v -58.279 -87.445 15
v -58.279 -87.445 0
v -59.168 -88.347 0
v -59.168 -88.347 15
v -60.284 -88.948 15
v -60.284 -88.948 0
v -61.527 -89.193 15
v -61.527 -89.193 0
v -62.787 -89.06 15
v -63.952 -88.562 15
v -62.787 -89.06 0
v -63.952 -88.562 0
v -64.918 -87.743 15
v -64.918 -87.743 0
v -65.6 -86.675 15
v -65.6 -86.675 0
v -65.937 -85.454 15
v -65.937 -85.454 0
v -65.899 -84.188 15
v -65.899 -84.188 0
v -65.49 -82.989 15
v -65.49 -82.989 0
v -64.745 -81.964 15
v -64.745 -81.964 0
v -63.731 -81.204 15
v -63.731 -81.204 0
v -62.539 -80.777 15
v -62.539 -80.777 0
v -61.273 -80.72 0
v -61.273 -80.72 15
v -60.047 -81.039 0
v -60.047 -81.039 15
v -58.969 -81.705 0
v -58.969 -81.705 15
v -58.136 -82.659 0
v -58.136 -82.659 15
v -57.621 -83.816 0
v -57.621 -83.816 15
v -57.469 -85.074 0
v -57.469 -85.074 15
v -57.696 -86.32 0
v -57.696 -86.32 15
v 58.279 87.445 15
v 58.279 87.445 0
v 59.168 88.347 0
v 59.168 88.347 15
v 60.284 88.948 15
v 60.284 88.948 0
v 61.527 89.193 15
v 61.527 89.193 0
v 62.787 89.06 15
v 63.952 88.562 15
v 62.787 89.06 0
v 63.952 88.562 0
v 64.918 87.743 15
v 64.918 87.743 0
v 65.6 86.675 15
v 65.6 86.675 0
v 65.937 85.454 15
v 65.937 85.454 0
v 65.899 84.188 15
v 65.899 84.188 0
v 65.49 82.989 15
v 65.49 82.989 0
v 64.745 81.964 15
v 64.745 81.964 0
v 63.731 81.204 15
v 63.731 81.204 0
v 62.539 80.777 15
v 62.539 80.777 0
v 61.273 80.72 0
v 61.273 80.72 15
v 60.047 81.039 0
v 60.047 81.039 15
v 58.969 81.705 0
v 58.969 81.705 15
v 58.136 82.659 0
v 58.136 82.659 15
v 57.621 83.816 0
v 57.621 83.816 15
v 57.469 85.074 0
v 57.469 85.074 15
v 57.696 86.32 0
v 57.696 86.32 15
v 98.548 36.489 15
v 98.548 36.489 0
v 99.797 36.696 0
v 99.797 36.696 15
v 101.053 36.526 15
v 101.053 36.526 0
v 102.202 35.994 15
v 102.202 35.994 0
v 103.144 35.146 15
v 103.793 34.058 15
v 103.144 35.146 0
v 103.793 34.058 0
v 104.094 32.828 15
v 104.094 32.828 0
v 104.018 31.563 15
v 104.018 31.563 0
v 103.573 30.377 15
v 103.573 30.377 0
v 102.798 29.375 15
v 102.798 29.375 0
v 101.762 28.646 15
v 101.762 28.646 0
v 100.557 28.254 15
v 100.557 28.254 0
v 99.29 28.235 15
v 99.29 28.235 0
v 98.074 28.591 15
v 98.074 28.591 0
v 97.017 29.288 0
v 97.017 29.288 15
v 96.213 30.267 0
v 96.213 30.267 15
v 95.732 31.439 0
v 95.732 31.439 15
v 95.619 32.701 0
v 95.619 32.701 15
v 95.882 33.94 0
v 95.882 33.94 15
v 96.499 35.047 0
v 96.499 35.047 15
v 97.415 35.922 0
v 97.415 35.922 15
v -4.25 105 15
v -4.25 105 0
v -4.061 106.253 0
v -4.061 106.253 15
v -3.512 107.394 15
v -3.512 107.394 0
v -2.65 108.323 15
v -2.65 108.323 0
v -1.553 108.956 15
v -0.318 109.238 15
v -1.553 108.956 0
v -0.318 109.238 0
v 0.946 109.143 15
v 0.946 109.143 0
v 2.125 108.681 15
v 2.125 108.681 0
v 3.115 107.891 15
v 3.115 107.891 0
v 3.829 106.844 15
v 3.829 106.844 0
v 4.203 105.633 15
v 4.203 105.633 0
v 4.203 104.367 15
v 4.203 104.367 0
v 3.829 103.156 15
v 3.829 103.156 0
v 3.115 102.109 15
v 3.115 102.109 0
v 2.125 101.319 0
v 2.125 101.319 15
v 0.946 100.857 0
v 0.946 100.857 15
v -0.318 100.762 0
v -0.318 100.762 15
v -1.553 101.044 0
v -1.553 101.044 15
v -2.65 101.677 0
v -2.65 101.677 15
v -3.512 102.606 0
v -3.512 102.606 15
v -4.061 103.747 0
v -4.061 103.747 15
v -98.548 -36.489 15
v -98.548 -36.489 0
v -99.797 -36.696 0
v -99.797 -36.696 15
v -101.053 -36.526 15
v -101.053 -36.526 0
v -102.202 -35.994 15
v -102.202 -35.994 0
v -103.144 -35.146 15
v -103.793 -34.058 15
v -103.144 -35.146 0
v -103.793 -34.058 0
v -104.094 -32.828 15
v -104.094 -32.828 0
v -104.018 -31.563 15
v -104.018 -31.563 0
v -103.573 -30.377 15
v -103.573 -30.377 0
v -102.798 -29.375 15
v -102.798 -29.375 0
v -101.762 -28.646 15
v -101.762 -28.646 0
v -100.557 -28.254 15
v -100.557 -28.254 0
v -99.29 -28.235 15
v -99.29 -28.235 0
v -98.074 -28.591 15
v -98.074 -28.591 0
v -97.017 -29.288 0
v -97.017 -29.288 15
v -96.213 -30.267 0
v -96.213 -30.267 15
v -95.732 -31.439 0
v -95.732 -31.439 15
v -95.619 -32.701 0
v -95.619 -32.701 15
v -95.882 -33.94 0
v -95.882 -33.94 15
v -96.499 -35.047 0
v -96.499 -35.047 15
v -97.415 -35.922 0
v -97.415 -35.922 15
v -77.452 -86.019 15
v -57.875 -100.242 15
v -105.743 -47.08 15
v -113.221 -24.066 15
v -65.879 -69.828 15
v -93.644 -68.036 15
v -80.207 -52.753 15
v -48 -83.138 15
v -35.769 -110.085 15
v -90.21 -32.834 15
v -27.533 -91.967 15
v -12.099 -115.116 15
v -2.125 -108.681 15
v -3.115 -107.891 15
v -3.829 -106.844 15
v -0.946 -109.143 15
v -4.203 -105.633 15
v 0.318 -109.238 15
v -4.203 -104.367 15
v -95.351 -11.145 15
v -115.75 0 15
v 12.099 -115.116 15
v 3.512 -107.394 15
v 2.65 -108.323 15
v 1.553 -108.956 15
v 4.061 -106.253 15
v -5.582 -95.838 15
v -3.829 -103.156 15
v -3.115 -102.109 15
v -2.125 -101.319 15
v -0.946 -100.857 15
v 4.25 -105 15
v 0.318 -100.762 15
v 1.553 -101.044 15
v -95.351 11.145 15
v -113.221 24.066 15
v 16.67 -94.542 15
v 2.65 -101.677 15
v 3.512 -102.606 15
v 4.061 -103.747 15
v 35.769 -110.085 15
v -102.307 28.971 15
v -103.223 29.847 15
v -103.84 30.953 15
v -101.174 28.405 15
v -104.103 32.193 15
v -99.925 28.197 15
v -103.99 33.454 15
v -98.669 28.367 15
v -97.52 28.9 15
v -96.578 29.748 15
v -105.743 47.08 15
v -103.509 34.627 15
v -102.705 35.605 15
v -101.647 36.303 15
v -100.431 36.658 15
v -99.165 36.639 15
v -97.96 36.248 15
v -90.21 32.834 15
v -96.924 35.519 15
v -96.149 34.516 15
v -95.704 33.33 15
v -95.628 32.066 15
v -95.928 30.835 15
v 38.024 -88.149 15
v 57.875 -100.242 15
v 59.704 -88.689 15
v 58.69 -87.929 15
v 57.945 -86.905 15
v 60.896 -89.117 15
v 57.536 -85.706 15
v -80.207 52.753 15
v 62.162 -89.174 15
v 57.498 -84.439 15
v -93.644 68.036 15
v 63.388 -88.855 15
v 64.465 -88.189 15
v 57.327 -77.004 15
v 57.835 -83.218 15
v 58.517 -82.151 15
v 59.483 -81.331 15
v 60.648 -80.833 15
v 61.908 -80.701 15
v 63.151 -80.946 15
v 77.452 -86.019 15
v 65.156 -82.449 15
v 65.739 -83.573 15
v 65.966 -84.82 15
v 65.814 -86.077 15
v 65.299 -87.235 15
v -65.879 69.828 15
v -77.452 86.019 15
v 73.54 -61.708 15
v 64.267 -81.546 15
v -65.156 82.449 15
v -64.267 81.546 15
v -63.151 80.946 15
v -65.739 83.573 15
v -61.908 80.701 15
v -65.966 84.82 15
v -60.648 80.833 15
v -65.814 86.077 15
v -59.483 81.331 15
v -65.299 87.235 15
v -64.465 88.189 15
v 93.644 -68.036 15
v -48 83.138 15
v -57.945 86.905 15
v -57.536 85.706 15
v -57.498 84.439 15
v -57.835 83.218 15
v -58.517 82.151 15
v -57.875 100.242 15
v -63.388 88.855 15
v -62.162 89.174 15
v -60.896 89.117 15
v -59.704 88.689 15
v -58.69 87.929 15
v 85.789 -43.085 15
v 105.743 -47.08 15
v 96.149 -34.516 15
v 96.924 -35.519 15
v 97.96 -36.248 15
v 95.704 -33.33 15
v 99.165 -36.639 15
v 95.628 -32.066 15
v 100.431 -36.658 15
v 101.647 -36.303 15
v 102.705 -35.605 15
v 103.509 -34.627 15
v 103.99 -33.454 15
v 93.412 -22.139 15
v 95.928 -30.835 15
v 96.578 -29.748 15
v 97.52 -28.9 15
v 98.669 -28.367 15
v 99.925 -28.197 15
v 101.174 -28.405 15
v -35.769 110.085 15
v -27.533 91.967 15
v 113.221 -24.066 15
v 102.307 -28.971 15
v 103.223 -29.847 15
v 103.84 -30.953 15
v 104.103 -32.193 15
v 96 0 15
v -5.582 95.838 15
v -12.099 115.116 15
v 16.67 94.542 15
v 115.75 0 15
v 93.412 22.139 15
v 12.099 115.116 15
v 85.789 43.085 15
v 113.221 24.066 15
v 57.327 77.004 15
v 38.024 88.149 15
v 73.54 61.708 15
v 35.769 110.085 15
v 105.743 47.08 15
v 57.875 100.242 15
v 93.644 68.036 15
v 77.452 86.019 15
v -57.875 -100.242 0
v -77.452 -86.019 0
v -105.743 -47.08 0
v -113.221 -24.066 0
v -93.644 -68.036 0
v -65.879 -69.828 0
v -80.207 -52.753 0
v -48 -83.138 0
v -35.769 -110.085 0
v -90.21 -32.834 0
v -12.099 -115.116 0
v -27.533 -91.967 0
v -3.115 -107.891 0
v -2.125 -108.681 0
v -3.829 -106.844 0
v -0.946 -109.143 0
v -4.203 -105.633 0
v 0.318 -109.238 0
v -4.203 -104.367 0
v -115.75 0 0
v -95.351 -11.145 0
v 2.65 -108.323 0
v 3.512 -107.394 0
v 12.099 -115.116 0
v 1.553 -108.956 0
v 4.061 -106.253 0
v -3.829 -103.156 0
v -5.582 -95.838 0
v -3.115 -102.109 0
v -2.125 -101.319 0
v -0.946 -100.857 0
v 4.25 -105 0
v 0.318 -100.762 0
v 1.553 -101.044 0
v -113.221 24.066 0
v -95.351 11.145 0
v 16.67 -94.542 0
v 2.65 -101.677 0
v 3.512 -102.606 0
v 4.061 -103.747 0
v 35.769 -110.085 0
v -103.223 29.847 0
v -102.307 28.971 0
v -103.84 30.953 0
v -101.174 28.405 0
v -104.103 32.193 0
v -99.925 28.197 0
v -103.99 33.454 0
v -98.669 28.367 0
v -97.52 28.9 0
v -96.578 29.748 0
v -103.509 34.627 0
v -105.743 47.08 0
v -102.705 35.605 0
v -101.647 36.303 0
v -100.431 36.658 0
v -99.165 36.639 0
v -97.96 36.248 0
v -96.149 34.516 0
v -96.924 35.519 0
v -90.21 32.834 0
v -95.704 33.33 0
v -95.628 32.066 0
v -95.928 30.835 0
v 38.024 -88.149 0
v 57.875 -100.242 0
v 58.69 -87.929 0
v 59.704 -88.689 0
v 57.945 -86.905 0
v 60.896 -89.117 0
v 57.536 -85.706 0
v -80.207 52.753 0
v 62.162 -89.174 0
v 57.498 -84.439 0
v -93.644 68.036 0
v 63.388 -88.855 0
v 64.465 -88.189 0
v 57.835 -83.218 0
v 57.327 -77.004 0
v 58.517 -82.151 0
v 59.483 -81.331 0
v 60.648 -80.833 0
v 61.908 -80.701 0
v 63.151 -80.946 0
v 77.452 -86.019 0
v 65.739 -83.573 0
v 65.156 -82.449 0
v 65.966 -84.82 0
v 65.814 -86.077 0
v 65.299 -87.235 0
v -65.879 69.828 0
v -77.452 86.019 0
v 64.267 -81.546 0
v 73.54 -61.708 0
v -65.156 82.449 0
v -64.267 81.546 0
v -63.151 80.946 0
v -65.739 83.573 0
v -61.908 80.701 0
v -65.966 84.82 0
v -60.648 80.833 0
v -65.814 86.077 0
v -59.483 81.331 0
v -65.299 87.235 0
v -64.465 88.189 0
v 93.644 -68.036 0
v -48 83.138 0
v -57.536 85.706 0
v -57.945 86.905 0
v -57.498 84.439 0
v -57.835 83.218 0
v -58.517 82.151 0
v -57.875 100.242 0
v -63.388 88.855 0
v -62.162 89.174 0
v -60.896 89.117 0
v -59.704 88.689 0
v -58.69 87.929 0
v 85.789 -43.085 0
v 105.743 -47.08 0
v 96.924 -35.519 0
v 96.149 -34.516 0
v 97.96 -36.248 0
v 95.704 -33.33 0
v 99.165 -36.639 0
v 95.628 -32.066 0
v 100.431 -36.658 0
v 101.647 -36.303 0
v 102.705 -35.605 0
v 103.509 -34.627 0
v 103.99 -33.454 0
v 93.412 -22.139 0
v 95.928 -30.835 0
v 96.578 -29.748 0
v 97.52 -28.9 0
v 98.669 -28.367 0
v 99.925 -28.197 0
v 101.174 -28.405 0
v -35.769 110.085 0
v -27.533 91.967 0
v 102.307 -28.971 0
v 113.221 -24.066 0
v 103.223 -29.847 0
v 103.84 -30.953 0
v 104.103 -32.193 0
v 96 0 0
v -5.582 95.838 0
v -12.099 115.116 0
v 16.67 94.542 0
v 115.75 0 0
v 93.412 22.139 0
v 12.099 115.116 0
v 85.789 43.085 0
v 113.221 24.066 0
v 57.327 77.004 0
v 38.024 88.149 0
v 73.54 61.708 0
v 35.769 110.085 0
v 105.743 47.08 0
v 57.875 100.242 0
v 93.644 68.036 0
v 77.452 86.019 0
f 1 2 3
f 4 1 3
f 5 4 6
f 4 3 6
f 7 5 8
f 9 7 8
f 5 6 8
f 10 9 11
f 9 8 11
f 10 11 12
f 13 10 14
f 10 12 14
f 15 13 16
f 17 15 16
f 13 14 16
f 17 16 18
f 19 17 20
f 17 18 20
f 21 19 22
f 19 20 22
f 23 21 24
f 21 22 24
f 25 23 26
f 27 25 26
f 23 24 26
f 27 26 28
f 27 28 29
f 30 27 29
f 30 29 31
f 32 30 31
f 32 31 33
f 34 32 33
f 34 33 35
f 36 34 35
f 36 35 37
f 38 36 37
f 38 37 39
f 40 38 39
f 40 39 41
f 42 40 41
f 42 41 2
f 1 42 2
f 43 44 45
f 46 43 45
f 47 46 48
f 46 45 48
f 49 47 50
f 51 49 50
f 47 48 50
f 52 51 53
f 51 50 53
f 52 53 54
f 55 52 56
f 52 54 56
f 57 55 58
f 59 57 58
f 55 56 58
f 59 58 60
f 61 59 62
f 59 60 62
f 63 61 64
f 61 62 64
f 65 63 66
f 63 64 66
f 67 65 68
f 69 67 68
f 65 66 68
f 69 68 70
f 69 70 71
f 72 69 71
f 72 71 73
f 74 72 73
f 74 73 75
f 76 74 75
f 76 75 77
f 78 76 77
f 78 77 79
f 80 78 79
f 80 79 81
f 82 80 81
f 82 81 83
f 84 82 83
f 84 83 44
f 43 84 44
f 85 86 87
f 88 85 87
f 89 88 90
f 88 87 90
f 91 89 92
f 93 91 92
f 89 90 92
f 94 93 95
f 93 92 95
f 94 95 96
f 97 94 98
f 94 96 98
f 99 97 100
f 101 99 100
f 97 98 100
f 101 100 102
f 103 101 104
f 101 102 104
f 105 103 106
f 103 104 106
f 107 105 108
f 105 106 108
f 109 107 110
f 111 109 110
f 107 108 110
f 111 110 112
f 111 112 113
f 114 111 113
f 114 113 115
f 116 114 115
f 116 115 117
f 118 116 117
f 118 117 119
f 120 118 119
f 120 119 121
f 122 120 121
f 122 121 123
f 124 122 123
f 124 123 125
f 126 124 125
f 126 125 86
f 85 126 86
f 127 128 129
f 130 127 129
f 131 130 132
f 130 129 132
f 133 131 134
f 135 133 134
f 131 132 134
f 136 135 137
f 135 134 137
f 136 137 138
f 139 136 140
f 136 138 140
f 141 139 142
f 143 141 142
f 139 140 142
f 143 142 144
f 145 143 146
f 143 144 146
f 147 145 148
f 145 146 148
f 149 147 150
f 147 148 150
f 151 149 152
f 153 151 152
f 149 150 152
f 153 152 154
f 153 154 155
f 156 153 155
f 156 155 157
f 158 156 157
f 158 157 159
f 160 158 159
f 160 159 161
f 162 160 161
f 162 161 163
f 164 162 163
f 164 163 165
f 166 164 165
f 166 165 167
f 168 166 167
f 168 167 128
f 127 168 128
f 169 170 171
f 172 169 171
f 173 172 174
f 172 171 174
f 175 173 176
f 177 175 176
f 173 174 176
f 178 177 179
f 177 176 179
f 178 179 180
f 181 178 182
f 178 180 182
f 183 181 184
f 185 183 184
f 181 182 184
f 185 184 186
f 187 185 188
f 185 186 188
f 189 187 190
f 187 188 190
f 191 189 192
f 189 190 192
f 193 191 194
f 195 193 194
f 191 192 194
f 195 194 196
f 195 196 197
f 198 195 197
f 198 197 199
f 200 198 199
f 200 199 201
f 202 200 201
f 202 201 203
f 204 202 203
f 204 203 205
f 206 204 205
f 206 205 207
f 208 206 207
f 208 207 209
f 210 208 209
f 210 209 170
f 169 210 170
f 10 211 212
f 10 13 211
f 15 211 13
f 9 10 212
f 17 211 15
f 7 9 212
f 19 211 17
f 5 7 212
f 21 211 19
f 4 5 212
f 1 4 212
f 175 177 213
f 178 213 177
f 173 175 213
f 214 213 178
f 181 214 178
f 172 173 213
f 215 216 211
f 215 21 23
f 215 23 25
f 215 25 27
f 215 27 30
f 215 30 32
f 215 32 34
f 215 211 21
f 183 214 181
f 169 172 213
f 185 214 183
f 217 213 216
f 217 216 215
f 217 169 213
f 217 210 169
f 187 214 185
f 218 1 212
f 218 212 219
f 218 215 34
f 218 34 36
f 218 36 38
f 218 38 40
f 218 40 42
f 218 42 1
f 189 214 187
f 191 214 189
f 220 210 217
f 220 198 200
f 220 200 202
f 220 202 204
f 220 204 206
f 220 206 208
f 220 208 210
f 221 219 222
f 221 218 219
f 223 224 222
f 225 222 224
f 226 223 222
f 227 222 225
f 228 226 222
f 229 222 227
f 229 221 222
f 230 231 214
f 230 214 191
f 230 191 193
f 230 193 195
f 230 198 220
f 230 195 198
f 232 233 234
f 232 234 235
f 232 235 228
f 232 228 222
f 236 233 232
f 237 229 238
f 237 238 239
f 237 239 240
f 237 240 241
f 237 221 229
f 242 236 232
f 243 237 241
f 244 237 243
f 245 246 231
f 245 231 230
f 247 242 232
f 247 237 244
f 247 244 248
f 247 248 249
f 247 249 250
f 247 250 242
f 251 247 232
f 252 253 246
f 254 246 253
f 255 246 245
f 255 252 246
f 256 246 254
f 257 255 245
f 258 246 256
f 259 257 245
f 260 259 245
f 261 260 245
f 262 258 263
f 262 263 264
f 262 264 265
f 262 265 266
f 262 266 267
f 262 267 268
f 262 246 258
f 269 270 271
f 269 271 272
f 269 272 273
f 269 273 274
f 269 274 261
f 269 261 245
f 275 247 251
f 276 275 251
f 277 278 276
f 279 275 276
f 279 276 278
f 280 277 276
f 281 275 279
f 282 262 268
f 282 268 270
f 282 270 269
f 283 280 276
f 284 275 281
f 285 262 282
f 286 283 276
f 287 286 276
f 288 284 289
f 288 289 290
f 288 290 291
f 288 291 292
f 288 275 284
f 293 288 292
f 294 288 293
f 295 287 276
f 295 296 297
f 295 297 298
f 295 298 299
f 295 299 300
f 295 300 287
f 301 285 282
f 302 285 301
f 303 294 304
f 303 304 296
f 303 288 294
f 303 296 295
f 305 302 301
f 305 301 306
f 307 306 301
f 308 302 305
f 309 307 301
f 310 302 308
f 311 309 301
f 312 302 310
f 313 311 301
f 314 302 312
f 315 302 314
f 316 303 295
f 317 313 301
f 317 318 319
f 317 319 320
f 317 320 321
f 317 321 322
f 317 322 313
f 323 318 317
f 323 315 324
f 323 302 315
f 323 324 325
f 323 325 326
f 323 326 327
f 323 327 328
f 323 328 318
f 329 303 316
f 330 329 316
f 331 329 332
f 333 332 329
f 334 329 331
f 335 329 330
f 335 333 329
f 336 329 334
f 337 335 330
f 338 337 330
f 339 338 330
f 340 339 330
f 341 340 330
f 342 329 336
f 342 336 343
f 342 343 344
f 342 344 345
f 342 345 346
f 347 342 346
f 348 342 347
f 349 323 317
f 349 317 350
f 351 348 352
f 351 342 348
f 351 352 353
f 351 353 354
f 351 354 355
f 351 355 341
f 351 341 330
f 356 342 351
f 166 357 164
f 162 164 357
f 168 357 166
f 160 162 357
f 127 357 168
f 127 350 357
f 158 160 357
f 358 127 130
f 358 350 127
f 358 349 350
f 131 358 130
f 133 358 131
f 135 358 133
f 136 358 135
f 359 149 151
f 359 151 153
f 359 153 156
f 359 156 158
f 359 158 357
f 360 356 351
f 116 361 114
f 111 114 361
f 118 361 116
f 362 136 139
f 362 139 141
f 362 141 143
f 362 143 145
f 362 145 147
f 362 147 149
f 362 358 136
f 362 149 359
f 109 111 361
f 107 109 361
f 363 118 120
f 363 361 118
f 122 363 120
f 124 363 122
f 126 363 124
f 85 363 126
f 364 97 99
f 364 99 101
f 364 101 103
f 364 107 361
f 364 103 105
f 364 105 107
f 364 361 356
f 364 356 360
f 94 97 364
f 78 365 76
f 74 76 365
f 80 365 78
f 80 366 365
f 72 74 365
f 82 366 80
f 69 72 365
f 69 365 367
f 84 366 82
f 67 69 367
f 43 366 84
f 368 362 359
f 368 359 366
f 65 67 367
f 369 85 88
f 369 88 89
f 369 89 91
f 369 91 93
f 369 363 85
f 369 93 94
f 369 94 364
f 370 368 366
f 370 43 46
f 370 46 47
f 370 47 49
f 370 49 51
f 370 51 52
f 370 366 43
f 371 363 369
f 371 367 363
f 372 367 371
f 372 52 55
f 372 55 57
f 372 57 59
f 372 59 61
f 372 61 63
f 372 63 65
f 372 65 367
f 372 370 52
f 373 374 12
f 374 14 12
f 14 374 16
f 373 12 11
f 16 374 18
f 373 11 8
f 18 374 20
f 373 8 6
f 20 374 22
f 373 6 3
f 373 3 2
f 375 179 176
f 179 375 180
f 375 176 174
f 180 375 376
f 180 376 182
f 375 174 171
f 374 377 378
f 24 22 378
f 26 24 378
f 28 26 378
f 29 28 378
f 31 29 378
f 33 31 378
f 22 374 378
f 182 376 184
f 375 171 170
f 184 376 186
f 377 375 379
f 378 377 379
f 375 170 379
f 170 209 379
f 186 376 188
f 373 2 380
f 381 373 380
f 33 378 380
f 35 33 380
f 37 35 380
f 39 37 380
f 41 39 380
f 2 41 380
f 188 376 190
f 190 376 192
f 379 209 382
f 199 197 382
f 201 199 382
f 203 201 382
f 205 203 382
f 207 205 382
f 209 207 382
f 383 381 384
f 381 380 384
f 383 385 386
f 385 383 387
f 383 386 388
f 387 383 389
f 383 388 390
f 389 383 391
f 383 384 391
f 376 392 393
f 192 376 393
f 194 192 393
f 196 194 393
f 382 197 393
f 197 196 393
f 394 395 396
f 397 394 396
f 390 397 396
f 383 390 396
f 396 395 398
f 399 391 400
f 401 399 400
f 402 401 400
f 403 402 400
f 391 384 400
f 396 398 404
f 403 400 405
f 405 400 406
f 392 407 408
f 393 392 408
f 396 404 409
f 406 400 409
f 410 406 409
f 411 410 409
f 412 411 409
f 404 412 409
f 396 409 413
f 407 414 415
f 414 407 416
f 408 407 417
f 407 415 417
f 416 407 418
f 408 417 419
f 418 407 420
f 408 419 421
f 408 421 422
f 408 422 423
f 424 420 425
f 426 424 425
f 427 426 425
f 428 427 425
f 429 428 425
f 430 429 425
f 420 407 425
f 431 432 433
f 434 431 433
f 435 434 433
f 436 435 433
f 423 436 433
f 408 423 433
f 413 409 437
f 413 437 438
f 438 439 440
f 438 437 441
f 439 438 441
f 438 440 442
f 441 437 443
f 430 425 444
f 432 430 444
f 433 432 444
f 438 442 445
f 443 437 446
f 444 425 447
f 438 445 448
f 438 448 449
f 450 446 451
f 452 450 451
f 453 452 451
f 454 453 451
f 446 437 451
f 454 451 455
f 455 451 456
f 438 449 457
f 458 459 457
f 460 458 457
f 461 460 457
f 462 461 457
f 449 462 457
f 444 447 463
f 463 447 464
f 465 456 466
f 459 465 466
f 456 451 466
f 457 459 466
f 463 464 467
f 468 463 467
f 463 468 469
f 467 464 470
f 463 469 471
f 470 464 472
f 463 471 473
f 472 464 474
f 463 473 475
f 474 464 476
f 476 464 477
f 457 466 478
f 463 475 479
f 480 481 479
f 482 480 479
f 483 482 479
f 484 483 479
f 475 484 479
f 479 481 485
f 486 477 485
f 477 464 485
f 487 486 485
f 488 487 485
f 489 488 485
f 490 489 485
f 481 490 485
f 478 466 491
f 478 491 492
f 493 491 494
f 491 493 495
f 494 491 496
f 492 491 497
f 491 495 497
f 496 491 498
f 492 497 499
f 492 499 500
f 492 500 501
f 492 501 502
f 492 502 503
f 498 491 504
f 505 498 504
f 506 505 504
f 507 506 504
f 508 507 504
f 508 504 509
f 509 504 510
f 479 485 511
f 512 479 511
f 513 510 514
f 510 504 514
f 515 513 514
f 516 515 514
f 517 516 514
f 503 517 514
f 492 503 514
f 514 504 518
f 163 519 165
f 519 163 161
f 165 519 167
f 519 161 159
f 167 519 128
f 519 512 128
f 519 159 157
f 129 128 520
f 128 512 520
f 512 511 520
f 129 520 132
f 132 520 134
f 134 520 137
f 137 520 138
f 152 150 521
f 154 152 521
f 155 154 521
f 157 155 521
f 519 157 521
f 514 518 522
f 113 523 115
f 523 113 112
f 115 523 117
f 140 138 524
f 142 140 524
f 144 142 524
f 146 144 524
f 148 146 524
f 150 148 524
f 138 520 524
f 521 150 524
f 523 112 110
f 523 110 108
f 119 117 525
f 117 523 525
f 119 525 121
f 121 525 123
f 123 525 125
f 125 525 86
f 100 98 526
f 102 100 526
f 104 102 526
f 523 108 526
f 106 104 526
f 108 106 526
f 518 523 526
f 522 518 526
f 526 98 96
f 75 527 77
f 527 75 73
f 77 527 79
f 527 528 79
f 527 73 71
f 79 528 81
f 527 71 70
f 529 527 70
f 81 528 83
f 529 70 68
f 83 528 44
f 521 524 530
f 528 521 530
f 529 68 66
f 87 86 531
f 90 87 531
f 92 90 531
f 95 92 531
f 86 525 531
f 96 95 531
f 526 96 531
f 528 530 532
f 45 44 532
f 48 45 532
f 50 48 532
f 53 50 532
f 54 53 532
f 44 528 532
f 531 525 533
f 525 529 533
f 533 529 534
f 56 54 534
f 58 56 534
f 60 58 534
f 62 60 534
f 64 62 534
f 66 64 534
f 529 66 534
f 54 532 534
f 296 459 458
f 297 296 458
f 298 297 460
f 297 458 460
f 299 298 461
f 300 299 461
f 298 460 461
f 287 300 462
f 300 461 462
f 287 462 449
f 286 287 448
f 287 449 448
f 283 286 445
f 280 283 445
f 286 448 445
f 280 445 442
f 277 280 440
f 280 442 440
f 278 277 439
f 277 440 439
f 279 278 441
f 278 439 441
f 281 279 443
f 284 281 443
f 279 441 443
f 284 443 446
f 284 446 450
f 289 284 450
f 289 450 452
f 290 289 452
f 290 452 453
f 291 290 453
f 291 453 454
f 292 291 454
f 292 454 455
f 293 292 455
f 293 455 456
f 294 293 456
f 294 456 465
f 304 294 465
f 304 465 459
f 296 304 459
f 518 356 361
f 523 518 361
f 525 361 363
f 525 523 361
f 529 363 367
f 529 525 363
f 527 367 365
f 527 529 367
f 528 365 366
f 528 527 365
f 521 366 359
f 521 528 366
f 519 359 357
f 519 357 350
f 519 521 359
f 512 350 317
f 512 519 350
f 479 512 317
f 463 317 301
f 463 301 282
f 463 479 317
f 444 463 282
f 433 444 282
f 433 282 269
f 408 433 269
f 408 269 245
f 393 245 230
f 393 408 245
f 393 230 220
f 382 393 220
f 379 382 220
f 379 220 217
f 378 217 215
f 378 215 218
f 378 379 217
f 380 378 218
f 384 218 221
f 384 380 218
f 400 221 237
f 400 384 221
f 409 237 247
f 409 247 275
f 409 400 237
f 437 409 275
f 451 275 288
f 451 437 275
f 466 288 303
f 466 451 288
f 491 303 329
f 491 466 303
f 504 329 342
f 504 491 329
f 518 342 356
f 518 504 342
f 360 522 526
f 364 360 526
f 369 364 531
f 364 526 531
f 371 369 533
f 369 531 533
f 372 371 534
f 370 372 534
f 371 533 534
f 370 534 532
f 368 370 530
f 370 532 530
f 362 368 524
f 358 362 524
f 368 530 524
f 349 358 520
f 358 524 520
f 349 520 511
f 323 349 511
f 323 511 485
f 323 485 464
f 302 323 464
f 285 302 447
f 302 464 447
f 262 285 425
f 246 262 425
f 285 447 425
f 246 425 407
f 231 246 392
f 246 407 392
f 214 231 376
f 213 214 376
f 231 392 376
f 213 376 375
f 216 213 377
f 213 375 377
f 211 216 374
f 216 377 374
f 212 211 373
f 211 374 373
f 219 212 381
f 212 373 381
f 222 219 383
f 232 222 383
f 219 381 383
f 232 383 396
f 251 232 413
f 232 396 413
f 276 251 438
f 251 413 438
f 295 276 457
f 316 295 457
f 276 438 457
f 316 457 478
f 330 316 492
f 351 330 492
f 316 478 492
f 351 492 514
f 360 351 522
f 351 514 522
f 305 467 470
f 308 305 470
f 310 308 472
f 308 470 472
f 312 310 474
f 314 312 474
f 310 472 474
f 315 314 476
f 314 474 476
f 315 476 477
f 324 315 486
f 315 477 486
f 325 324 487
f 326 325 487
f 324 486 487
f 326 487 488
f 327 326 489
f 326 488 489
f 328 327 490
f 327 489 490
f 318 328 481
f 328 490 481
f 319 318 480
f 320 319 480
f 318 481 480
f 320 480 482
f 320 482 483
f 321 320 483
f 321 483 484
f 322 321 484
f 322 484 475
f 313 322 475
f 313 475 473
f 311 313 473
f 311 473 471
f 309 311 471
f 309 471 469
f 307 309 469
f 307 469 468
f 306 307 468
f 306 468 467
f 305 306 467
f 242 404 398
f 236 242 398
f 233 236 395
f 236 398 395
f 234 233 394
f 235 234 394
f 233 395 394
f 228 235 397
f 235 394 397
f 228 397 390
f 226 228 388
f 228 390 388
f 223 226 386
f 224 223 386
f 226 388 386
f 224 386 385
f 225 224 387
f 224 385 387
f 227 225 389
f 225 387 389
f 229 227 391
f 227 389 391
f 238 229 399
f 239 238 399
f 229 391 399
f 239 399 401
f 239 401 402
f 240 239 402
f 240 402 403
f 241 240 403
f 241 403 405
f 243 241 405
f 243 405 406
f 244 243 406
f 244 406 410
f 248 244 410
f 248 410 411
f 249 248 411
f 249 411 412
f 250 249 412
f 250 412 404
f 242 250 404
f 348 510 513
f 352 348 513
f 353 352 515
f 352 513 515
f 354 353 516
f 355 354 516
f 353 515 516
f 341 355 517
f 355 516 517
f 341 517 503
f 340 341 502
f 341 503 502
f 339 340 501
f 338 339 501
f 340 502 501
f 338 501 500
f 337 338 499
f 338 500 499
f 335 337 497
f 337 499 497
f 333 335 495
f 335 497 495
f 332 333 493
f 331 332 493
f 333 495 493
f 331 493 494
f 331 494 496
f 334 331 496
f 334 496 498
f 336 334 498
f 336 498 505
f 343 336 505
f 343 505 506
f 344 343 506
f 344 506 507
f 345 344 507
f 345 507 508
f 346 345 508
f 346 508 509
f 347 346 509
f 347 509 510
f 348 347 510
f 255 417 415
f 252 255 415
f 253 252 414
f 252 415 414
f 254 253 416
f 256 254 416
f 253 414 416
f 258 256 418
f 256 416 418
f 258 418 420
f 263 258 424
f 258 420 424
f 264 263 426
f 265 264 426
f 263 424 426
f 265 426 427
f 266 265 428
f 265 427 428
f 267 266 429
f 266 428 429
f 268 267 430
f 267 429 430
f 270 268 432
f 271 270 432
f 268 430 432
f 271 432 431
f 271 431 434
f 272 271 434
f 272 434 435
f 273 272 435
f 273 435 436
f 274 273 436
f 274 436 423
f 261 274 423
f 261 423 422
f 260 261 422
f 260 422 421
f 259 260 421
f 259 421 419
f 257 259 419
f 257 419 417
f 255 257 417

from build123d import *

# Parameters (mm, degrees)
F0_R            = 115.75
F0_R_2          = 96
F1_DEPTH        = 15
F3_D            = 8.5
F3_COPIES_COUNT = 10


# Not quite as in the source:
# - a pattern or mirror of a feature is missing from the dataset's text; its kind, count and spacing are read off the source's solid


with BuildPart() as f1:
    # F0 (on Top) → F1 (new body)
    with BuildSketch(Plane.XY):
        Circle(F0_R)
        Circle(F0_R_2, mode=Mode.SUBTRACT)
    extrude(amount=F1_DEPTH)

    # F3 (through all)
    with Locations(Plane.XY.offset(15)):
        with Locations((0, 105)):
            f3 = Hole(F3_D / 2)

    # F3_copies: F3 ×10 about axis
    f3_copies_axis = Axis((0, 0, 0), (0, 0, 1))
    for i in range(1, F3_COPIES_COUNT):
        add(f3.rotate(f3_copies_axis, i * 360 / F3_COPIES_COUNT), mode=Mode.SUBTRACT)


solid = f1.part
